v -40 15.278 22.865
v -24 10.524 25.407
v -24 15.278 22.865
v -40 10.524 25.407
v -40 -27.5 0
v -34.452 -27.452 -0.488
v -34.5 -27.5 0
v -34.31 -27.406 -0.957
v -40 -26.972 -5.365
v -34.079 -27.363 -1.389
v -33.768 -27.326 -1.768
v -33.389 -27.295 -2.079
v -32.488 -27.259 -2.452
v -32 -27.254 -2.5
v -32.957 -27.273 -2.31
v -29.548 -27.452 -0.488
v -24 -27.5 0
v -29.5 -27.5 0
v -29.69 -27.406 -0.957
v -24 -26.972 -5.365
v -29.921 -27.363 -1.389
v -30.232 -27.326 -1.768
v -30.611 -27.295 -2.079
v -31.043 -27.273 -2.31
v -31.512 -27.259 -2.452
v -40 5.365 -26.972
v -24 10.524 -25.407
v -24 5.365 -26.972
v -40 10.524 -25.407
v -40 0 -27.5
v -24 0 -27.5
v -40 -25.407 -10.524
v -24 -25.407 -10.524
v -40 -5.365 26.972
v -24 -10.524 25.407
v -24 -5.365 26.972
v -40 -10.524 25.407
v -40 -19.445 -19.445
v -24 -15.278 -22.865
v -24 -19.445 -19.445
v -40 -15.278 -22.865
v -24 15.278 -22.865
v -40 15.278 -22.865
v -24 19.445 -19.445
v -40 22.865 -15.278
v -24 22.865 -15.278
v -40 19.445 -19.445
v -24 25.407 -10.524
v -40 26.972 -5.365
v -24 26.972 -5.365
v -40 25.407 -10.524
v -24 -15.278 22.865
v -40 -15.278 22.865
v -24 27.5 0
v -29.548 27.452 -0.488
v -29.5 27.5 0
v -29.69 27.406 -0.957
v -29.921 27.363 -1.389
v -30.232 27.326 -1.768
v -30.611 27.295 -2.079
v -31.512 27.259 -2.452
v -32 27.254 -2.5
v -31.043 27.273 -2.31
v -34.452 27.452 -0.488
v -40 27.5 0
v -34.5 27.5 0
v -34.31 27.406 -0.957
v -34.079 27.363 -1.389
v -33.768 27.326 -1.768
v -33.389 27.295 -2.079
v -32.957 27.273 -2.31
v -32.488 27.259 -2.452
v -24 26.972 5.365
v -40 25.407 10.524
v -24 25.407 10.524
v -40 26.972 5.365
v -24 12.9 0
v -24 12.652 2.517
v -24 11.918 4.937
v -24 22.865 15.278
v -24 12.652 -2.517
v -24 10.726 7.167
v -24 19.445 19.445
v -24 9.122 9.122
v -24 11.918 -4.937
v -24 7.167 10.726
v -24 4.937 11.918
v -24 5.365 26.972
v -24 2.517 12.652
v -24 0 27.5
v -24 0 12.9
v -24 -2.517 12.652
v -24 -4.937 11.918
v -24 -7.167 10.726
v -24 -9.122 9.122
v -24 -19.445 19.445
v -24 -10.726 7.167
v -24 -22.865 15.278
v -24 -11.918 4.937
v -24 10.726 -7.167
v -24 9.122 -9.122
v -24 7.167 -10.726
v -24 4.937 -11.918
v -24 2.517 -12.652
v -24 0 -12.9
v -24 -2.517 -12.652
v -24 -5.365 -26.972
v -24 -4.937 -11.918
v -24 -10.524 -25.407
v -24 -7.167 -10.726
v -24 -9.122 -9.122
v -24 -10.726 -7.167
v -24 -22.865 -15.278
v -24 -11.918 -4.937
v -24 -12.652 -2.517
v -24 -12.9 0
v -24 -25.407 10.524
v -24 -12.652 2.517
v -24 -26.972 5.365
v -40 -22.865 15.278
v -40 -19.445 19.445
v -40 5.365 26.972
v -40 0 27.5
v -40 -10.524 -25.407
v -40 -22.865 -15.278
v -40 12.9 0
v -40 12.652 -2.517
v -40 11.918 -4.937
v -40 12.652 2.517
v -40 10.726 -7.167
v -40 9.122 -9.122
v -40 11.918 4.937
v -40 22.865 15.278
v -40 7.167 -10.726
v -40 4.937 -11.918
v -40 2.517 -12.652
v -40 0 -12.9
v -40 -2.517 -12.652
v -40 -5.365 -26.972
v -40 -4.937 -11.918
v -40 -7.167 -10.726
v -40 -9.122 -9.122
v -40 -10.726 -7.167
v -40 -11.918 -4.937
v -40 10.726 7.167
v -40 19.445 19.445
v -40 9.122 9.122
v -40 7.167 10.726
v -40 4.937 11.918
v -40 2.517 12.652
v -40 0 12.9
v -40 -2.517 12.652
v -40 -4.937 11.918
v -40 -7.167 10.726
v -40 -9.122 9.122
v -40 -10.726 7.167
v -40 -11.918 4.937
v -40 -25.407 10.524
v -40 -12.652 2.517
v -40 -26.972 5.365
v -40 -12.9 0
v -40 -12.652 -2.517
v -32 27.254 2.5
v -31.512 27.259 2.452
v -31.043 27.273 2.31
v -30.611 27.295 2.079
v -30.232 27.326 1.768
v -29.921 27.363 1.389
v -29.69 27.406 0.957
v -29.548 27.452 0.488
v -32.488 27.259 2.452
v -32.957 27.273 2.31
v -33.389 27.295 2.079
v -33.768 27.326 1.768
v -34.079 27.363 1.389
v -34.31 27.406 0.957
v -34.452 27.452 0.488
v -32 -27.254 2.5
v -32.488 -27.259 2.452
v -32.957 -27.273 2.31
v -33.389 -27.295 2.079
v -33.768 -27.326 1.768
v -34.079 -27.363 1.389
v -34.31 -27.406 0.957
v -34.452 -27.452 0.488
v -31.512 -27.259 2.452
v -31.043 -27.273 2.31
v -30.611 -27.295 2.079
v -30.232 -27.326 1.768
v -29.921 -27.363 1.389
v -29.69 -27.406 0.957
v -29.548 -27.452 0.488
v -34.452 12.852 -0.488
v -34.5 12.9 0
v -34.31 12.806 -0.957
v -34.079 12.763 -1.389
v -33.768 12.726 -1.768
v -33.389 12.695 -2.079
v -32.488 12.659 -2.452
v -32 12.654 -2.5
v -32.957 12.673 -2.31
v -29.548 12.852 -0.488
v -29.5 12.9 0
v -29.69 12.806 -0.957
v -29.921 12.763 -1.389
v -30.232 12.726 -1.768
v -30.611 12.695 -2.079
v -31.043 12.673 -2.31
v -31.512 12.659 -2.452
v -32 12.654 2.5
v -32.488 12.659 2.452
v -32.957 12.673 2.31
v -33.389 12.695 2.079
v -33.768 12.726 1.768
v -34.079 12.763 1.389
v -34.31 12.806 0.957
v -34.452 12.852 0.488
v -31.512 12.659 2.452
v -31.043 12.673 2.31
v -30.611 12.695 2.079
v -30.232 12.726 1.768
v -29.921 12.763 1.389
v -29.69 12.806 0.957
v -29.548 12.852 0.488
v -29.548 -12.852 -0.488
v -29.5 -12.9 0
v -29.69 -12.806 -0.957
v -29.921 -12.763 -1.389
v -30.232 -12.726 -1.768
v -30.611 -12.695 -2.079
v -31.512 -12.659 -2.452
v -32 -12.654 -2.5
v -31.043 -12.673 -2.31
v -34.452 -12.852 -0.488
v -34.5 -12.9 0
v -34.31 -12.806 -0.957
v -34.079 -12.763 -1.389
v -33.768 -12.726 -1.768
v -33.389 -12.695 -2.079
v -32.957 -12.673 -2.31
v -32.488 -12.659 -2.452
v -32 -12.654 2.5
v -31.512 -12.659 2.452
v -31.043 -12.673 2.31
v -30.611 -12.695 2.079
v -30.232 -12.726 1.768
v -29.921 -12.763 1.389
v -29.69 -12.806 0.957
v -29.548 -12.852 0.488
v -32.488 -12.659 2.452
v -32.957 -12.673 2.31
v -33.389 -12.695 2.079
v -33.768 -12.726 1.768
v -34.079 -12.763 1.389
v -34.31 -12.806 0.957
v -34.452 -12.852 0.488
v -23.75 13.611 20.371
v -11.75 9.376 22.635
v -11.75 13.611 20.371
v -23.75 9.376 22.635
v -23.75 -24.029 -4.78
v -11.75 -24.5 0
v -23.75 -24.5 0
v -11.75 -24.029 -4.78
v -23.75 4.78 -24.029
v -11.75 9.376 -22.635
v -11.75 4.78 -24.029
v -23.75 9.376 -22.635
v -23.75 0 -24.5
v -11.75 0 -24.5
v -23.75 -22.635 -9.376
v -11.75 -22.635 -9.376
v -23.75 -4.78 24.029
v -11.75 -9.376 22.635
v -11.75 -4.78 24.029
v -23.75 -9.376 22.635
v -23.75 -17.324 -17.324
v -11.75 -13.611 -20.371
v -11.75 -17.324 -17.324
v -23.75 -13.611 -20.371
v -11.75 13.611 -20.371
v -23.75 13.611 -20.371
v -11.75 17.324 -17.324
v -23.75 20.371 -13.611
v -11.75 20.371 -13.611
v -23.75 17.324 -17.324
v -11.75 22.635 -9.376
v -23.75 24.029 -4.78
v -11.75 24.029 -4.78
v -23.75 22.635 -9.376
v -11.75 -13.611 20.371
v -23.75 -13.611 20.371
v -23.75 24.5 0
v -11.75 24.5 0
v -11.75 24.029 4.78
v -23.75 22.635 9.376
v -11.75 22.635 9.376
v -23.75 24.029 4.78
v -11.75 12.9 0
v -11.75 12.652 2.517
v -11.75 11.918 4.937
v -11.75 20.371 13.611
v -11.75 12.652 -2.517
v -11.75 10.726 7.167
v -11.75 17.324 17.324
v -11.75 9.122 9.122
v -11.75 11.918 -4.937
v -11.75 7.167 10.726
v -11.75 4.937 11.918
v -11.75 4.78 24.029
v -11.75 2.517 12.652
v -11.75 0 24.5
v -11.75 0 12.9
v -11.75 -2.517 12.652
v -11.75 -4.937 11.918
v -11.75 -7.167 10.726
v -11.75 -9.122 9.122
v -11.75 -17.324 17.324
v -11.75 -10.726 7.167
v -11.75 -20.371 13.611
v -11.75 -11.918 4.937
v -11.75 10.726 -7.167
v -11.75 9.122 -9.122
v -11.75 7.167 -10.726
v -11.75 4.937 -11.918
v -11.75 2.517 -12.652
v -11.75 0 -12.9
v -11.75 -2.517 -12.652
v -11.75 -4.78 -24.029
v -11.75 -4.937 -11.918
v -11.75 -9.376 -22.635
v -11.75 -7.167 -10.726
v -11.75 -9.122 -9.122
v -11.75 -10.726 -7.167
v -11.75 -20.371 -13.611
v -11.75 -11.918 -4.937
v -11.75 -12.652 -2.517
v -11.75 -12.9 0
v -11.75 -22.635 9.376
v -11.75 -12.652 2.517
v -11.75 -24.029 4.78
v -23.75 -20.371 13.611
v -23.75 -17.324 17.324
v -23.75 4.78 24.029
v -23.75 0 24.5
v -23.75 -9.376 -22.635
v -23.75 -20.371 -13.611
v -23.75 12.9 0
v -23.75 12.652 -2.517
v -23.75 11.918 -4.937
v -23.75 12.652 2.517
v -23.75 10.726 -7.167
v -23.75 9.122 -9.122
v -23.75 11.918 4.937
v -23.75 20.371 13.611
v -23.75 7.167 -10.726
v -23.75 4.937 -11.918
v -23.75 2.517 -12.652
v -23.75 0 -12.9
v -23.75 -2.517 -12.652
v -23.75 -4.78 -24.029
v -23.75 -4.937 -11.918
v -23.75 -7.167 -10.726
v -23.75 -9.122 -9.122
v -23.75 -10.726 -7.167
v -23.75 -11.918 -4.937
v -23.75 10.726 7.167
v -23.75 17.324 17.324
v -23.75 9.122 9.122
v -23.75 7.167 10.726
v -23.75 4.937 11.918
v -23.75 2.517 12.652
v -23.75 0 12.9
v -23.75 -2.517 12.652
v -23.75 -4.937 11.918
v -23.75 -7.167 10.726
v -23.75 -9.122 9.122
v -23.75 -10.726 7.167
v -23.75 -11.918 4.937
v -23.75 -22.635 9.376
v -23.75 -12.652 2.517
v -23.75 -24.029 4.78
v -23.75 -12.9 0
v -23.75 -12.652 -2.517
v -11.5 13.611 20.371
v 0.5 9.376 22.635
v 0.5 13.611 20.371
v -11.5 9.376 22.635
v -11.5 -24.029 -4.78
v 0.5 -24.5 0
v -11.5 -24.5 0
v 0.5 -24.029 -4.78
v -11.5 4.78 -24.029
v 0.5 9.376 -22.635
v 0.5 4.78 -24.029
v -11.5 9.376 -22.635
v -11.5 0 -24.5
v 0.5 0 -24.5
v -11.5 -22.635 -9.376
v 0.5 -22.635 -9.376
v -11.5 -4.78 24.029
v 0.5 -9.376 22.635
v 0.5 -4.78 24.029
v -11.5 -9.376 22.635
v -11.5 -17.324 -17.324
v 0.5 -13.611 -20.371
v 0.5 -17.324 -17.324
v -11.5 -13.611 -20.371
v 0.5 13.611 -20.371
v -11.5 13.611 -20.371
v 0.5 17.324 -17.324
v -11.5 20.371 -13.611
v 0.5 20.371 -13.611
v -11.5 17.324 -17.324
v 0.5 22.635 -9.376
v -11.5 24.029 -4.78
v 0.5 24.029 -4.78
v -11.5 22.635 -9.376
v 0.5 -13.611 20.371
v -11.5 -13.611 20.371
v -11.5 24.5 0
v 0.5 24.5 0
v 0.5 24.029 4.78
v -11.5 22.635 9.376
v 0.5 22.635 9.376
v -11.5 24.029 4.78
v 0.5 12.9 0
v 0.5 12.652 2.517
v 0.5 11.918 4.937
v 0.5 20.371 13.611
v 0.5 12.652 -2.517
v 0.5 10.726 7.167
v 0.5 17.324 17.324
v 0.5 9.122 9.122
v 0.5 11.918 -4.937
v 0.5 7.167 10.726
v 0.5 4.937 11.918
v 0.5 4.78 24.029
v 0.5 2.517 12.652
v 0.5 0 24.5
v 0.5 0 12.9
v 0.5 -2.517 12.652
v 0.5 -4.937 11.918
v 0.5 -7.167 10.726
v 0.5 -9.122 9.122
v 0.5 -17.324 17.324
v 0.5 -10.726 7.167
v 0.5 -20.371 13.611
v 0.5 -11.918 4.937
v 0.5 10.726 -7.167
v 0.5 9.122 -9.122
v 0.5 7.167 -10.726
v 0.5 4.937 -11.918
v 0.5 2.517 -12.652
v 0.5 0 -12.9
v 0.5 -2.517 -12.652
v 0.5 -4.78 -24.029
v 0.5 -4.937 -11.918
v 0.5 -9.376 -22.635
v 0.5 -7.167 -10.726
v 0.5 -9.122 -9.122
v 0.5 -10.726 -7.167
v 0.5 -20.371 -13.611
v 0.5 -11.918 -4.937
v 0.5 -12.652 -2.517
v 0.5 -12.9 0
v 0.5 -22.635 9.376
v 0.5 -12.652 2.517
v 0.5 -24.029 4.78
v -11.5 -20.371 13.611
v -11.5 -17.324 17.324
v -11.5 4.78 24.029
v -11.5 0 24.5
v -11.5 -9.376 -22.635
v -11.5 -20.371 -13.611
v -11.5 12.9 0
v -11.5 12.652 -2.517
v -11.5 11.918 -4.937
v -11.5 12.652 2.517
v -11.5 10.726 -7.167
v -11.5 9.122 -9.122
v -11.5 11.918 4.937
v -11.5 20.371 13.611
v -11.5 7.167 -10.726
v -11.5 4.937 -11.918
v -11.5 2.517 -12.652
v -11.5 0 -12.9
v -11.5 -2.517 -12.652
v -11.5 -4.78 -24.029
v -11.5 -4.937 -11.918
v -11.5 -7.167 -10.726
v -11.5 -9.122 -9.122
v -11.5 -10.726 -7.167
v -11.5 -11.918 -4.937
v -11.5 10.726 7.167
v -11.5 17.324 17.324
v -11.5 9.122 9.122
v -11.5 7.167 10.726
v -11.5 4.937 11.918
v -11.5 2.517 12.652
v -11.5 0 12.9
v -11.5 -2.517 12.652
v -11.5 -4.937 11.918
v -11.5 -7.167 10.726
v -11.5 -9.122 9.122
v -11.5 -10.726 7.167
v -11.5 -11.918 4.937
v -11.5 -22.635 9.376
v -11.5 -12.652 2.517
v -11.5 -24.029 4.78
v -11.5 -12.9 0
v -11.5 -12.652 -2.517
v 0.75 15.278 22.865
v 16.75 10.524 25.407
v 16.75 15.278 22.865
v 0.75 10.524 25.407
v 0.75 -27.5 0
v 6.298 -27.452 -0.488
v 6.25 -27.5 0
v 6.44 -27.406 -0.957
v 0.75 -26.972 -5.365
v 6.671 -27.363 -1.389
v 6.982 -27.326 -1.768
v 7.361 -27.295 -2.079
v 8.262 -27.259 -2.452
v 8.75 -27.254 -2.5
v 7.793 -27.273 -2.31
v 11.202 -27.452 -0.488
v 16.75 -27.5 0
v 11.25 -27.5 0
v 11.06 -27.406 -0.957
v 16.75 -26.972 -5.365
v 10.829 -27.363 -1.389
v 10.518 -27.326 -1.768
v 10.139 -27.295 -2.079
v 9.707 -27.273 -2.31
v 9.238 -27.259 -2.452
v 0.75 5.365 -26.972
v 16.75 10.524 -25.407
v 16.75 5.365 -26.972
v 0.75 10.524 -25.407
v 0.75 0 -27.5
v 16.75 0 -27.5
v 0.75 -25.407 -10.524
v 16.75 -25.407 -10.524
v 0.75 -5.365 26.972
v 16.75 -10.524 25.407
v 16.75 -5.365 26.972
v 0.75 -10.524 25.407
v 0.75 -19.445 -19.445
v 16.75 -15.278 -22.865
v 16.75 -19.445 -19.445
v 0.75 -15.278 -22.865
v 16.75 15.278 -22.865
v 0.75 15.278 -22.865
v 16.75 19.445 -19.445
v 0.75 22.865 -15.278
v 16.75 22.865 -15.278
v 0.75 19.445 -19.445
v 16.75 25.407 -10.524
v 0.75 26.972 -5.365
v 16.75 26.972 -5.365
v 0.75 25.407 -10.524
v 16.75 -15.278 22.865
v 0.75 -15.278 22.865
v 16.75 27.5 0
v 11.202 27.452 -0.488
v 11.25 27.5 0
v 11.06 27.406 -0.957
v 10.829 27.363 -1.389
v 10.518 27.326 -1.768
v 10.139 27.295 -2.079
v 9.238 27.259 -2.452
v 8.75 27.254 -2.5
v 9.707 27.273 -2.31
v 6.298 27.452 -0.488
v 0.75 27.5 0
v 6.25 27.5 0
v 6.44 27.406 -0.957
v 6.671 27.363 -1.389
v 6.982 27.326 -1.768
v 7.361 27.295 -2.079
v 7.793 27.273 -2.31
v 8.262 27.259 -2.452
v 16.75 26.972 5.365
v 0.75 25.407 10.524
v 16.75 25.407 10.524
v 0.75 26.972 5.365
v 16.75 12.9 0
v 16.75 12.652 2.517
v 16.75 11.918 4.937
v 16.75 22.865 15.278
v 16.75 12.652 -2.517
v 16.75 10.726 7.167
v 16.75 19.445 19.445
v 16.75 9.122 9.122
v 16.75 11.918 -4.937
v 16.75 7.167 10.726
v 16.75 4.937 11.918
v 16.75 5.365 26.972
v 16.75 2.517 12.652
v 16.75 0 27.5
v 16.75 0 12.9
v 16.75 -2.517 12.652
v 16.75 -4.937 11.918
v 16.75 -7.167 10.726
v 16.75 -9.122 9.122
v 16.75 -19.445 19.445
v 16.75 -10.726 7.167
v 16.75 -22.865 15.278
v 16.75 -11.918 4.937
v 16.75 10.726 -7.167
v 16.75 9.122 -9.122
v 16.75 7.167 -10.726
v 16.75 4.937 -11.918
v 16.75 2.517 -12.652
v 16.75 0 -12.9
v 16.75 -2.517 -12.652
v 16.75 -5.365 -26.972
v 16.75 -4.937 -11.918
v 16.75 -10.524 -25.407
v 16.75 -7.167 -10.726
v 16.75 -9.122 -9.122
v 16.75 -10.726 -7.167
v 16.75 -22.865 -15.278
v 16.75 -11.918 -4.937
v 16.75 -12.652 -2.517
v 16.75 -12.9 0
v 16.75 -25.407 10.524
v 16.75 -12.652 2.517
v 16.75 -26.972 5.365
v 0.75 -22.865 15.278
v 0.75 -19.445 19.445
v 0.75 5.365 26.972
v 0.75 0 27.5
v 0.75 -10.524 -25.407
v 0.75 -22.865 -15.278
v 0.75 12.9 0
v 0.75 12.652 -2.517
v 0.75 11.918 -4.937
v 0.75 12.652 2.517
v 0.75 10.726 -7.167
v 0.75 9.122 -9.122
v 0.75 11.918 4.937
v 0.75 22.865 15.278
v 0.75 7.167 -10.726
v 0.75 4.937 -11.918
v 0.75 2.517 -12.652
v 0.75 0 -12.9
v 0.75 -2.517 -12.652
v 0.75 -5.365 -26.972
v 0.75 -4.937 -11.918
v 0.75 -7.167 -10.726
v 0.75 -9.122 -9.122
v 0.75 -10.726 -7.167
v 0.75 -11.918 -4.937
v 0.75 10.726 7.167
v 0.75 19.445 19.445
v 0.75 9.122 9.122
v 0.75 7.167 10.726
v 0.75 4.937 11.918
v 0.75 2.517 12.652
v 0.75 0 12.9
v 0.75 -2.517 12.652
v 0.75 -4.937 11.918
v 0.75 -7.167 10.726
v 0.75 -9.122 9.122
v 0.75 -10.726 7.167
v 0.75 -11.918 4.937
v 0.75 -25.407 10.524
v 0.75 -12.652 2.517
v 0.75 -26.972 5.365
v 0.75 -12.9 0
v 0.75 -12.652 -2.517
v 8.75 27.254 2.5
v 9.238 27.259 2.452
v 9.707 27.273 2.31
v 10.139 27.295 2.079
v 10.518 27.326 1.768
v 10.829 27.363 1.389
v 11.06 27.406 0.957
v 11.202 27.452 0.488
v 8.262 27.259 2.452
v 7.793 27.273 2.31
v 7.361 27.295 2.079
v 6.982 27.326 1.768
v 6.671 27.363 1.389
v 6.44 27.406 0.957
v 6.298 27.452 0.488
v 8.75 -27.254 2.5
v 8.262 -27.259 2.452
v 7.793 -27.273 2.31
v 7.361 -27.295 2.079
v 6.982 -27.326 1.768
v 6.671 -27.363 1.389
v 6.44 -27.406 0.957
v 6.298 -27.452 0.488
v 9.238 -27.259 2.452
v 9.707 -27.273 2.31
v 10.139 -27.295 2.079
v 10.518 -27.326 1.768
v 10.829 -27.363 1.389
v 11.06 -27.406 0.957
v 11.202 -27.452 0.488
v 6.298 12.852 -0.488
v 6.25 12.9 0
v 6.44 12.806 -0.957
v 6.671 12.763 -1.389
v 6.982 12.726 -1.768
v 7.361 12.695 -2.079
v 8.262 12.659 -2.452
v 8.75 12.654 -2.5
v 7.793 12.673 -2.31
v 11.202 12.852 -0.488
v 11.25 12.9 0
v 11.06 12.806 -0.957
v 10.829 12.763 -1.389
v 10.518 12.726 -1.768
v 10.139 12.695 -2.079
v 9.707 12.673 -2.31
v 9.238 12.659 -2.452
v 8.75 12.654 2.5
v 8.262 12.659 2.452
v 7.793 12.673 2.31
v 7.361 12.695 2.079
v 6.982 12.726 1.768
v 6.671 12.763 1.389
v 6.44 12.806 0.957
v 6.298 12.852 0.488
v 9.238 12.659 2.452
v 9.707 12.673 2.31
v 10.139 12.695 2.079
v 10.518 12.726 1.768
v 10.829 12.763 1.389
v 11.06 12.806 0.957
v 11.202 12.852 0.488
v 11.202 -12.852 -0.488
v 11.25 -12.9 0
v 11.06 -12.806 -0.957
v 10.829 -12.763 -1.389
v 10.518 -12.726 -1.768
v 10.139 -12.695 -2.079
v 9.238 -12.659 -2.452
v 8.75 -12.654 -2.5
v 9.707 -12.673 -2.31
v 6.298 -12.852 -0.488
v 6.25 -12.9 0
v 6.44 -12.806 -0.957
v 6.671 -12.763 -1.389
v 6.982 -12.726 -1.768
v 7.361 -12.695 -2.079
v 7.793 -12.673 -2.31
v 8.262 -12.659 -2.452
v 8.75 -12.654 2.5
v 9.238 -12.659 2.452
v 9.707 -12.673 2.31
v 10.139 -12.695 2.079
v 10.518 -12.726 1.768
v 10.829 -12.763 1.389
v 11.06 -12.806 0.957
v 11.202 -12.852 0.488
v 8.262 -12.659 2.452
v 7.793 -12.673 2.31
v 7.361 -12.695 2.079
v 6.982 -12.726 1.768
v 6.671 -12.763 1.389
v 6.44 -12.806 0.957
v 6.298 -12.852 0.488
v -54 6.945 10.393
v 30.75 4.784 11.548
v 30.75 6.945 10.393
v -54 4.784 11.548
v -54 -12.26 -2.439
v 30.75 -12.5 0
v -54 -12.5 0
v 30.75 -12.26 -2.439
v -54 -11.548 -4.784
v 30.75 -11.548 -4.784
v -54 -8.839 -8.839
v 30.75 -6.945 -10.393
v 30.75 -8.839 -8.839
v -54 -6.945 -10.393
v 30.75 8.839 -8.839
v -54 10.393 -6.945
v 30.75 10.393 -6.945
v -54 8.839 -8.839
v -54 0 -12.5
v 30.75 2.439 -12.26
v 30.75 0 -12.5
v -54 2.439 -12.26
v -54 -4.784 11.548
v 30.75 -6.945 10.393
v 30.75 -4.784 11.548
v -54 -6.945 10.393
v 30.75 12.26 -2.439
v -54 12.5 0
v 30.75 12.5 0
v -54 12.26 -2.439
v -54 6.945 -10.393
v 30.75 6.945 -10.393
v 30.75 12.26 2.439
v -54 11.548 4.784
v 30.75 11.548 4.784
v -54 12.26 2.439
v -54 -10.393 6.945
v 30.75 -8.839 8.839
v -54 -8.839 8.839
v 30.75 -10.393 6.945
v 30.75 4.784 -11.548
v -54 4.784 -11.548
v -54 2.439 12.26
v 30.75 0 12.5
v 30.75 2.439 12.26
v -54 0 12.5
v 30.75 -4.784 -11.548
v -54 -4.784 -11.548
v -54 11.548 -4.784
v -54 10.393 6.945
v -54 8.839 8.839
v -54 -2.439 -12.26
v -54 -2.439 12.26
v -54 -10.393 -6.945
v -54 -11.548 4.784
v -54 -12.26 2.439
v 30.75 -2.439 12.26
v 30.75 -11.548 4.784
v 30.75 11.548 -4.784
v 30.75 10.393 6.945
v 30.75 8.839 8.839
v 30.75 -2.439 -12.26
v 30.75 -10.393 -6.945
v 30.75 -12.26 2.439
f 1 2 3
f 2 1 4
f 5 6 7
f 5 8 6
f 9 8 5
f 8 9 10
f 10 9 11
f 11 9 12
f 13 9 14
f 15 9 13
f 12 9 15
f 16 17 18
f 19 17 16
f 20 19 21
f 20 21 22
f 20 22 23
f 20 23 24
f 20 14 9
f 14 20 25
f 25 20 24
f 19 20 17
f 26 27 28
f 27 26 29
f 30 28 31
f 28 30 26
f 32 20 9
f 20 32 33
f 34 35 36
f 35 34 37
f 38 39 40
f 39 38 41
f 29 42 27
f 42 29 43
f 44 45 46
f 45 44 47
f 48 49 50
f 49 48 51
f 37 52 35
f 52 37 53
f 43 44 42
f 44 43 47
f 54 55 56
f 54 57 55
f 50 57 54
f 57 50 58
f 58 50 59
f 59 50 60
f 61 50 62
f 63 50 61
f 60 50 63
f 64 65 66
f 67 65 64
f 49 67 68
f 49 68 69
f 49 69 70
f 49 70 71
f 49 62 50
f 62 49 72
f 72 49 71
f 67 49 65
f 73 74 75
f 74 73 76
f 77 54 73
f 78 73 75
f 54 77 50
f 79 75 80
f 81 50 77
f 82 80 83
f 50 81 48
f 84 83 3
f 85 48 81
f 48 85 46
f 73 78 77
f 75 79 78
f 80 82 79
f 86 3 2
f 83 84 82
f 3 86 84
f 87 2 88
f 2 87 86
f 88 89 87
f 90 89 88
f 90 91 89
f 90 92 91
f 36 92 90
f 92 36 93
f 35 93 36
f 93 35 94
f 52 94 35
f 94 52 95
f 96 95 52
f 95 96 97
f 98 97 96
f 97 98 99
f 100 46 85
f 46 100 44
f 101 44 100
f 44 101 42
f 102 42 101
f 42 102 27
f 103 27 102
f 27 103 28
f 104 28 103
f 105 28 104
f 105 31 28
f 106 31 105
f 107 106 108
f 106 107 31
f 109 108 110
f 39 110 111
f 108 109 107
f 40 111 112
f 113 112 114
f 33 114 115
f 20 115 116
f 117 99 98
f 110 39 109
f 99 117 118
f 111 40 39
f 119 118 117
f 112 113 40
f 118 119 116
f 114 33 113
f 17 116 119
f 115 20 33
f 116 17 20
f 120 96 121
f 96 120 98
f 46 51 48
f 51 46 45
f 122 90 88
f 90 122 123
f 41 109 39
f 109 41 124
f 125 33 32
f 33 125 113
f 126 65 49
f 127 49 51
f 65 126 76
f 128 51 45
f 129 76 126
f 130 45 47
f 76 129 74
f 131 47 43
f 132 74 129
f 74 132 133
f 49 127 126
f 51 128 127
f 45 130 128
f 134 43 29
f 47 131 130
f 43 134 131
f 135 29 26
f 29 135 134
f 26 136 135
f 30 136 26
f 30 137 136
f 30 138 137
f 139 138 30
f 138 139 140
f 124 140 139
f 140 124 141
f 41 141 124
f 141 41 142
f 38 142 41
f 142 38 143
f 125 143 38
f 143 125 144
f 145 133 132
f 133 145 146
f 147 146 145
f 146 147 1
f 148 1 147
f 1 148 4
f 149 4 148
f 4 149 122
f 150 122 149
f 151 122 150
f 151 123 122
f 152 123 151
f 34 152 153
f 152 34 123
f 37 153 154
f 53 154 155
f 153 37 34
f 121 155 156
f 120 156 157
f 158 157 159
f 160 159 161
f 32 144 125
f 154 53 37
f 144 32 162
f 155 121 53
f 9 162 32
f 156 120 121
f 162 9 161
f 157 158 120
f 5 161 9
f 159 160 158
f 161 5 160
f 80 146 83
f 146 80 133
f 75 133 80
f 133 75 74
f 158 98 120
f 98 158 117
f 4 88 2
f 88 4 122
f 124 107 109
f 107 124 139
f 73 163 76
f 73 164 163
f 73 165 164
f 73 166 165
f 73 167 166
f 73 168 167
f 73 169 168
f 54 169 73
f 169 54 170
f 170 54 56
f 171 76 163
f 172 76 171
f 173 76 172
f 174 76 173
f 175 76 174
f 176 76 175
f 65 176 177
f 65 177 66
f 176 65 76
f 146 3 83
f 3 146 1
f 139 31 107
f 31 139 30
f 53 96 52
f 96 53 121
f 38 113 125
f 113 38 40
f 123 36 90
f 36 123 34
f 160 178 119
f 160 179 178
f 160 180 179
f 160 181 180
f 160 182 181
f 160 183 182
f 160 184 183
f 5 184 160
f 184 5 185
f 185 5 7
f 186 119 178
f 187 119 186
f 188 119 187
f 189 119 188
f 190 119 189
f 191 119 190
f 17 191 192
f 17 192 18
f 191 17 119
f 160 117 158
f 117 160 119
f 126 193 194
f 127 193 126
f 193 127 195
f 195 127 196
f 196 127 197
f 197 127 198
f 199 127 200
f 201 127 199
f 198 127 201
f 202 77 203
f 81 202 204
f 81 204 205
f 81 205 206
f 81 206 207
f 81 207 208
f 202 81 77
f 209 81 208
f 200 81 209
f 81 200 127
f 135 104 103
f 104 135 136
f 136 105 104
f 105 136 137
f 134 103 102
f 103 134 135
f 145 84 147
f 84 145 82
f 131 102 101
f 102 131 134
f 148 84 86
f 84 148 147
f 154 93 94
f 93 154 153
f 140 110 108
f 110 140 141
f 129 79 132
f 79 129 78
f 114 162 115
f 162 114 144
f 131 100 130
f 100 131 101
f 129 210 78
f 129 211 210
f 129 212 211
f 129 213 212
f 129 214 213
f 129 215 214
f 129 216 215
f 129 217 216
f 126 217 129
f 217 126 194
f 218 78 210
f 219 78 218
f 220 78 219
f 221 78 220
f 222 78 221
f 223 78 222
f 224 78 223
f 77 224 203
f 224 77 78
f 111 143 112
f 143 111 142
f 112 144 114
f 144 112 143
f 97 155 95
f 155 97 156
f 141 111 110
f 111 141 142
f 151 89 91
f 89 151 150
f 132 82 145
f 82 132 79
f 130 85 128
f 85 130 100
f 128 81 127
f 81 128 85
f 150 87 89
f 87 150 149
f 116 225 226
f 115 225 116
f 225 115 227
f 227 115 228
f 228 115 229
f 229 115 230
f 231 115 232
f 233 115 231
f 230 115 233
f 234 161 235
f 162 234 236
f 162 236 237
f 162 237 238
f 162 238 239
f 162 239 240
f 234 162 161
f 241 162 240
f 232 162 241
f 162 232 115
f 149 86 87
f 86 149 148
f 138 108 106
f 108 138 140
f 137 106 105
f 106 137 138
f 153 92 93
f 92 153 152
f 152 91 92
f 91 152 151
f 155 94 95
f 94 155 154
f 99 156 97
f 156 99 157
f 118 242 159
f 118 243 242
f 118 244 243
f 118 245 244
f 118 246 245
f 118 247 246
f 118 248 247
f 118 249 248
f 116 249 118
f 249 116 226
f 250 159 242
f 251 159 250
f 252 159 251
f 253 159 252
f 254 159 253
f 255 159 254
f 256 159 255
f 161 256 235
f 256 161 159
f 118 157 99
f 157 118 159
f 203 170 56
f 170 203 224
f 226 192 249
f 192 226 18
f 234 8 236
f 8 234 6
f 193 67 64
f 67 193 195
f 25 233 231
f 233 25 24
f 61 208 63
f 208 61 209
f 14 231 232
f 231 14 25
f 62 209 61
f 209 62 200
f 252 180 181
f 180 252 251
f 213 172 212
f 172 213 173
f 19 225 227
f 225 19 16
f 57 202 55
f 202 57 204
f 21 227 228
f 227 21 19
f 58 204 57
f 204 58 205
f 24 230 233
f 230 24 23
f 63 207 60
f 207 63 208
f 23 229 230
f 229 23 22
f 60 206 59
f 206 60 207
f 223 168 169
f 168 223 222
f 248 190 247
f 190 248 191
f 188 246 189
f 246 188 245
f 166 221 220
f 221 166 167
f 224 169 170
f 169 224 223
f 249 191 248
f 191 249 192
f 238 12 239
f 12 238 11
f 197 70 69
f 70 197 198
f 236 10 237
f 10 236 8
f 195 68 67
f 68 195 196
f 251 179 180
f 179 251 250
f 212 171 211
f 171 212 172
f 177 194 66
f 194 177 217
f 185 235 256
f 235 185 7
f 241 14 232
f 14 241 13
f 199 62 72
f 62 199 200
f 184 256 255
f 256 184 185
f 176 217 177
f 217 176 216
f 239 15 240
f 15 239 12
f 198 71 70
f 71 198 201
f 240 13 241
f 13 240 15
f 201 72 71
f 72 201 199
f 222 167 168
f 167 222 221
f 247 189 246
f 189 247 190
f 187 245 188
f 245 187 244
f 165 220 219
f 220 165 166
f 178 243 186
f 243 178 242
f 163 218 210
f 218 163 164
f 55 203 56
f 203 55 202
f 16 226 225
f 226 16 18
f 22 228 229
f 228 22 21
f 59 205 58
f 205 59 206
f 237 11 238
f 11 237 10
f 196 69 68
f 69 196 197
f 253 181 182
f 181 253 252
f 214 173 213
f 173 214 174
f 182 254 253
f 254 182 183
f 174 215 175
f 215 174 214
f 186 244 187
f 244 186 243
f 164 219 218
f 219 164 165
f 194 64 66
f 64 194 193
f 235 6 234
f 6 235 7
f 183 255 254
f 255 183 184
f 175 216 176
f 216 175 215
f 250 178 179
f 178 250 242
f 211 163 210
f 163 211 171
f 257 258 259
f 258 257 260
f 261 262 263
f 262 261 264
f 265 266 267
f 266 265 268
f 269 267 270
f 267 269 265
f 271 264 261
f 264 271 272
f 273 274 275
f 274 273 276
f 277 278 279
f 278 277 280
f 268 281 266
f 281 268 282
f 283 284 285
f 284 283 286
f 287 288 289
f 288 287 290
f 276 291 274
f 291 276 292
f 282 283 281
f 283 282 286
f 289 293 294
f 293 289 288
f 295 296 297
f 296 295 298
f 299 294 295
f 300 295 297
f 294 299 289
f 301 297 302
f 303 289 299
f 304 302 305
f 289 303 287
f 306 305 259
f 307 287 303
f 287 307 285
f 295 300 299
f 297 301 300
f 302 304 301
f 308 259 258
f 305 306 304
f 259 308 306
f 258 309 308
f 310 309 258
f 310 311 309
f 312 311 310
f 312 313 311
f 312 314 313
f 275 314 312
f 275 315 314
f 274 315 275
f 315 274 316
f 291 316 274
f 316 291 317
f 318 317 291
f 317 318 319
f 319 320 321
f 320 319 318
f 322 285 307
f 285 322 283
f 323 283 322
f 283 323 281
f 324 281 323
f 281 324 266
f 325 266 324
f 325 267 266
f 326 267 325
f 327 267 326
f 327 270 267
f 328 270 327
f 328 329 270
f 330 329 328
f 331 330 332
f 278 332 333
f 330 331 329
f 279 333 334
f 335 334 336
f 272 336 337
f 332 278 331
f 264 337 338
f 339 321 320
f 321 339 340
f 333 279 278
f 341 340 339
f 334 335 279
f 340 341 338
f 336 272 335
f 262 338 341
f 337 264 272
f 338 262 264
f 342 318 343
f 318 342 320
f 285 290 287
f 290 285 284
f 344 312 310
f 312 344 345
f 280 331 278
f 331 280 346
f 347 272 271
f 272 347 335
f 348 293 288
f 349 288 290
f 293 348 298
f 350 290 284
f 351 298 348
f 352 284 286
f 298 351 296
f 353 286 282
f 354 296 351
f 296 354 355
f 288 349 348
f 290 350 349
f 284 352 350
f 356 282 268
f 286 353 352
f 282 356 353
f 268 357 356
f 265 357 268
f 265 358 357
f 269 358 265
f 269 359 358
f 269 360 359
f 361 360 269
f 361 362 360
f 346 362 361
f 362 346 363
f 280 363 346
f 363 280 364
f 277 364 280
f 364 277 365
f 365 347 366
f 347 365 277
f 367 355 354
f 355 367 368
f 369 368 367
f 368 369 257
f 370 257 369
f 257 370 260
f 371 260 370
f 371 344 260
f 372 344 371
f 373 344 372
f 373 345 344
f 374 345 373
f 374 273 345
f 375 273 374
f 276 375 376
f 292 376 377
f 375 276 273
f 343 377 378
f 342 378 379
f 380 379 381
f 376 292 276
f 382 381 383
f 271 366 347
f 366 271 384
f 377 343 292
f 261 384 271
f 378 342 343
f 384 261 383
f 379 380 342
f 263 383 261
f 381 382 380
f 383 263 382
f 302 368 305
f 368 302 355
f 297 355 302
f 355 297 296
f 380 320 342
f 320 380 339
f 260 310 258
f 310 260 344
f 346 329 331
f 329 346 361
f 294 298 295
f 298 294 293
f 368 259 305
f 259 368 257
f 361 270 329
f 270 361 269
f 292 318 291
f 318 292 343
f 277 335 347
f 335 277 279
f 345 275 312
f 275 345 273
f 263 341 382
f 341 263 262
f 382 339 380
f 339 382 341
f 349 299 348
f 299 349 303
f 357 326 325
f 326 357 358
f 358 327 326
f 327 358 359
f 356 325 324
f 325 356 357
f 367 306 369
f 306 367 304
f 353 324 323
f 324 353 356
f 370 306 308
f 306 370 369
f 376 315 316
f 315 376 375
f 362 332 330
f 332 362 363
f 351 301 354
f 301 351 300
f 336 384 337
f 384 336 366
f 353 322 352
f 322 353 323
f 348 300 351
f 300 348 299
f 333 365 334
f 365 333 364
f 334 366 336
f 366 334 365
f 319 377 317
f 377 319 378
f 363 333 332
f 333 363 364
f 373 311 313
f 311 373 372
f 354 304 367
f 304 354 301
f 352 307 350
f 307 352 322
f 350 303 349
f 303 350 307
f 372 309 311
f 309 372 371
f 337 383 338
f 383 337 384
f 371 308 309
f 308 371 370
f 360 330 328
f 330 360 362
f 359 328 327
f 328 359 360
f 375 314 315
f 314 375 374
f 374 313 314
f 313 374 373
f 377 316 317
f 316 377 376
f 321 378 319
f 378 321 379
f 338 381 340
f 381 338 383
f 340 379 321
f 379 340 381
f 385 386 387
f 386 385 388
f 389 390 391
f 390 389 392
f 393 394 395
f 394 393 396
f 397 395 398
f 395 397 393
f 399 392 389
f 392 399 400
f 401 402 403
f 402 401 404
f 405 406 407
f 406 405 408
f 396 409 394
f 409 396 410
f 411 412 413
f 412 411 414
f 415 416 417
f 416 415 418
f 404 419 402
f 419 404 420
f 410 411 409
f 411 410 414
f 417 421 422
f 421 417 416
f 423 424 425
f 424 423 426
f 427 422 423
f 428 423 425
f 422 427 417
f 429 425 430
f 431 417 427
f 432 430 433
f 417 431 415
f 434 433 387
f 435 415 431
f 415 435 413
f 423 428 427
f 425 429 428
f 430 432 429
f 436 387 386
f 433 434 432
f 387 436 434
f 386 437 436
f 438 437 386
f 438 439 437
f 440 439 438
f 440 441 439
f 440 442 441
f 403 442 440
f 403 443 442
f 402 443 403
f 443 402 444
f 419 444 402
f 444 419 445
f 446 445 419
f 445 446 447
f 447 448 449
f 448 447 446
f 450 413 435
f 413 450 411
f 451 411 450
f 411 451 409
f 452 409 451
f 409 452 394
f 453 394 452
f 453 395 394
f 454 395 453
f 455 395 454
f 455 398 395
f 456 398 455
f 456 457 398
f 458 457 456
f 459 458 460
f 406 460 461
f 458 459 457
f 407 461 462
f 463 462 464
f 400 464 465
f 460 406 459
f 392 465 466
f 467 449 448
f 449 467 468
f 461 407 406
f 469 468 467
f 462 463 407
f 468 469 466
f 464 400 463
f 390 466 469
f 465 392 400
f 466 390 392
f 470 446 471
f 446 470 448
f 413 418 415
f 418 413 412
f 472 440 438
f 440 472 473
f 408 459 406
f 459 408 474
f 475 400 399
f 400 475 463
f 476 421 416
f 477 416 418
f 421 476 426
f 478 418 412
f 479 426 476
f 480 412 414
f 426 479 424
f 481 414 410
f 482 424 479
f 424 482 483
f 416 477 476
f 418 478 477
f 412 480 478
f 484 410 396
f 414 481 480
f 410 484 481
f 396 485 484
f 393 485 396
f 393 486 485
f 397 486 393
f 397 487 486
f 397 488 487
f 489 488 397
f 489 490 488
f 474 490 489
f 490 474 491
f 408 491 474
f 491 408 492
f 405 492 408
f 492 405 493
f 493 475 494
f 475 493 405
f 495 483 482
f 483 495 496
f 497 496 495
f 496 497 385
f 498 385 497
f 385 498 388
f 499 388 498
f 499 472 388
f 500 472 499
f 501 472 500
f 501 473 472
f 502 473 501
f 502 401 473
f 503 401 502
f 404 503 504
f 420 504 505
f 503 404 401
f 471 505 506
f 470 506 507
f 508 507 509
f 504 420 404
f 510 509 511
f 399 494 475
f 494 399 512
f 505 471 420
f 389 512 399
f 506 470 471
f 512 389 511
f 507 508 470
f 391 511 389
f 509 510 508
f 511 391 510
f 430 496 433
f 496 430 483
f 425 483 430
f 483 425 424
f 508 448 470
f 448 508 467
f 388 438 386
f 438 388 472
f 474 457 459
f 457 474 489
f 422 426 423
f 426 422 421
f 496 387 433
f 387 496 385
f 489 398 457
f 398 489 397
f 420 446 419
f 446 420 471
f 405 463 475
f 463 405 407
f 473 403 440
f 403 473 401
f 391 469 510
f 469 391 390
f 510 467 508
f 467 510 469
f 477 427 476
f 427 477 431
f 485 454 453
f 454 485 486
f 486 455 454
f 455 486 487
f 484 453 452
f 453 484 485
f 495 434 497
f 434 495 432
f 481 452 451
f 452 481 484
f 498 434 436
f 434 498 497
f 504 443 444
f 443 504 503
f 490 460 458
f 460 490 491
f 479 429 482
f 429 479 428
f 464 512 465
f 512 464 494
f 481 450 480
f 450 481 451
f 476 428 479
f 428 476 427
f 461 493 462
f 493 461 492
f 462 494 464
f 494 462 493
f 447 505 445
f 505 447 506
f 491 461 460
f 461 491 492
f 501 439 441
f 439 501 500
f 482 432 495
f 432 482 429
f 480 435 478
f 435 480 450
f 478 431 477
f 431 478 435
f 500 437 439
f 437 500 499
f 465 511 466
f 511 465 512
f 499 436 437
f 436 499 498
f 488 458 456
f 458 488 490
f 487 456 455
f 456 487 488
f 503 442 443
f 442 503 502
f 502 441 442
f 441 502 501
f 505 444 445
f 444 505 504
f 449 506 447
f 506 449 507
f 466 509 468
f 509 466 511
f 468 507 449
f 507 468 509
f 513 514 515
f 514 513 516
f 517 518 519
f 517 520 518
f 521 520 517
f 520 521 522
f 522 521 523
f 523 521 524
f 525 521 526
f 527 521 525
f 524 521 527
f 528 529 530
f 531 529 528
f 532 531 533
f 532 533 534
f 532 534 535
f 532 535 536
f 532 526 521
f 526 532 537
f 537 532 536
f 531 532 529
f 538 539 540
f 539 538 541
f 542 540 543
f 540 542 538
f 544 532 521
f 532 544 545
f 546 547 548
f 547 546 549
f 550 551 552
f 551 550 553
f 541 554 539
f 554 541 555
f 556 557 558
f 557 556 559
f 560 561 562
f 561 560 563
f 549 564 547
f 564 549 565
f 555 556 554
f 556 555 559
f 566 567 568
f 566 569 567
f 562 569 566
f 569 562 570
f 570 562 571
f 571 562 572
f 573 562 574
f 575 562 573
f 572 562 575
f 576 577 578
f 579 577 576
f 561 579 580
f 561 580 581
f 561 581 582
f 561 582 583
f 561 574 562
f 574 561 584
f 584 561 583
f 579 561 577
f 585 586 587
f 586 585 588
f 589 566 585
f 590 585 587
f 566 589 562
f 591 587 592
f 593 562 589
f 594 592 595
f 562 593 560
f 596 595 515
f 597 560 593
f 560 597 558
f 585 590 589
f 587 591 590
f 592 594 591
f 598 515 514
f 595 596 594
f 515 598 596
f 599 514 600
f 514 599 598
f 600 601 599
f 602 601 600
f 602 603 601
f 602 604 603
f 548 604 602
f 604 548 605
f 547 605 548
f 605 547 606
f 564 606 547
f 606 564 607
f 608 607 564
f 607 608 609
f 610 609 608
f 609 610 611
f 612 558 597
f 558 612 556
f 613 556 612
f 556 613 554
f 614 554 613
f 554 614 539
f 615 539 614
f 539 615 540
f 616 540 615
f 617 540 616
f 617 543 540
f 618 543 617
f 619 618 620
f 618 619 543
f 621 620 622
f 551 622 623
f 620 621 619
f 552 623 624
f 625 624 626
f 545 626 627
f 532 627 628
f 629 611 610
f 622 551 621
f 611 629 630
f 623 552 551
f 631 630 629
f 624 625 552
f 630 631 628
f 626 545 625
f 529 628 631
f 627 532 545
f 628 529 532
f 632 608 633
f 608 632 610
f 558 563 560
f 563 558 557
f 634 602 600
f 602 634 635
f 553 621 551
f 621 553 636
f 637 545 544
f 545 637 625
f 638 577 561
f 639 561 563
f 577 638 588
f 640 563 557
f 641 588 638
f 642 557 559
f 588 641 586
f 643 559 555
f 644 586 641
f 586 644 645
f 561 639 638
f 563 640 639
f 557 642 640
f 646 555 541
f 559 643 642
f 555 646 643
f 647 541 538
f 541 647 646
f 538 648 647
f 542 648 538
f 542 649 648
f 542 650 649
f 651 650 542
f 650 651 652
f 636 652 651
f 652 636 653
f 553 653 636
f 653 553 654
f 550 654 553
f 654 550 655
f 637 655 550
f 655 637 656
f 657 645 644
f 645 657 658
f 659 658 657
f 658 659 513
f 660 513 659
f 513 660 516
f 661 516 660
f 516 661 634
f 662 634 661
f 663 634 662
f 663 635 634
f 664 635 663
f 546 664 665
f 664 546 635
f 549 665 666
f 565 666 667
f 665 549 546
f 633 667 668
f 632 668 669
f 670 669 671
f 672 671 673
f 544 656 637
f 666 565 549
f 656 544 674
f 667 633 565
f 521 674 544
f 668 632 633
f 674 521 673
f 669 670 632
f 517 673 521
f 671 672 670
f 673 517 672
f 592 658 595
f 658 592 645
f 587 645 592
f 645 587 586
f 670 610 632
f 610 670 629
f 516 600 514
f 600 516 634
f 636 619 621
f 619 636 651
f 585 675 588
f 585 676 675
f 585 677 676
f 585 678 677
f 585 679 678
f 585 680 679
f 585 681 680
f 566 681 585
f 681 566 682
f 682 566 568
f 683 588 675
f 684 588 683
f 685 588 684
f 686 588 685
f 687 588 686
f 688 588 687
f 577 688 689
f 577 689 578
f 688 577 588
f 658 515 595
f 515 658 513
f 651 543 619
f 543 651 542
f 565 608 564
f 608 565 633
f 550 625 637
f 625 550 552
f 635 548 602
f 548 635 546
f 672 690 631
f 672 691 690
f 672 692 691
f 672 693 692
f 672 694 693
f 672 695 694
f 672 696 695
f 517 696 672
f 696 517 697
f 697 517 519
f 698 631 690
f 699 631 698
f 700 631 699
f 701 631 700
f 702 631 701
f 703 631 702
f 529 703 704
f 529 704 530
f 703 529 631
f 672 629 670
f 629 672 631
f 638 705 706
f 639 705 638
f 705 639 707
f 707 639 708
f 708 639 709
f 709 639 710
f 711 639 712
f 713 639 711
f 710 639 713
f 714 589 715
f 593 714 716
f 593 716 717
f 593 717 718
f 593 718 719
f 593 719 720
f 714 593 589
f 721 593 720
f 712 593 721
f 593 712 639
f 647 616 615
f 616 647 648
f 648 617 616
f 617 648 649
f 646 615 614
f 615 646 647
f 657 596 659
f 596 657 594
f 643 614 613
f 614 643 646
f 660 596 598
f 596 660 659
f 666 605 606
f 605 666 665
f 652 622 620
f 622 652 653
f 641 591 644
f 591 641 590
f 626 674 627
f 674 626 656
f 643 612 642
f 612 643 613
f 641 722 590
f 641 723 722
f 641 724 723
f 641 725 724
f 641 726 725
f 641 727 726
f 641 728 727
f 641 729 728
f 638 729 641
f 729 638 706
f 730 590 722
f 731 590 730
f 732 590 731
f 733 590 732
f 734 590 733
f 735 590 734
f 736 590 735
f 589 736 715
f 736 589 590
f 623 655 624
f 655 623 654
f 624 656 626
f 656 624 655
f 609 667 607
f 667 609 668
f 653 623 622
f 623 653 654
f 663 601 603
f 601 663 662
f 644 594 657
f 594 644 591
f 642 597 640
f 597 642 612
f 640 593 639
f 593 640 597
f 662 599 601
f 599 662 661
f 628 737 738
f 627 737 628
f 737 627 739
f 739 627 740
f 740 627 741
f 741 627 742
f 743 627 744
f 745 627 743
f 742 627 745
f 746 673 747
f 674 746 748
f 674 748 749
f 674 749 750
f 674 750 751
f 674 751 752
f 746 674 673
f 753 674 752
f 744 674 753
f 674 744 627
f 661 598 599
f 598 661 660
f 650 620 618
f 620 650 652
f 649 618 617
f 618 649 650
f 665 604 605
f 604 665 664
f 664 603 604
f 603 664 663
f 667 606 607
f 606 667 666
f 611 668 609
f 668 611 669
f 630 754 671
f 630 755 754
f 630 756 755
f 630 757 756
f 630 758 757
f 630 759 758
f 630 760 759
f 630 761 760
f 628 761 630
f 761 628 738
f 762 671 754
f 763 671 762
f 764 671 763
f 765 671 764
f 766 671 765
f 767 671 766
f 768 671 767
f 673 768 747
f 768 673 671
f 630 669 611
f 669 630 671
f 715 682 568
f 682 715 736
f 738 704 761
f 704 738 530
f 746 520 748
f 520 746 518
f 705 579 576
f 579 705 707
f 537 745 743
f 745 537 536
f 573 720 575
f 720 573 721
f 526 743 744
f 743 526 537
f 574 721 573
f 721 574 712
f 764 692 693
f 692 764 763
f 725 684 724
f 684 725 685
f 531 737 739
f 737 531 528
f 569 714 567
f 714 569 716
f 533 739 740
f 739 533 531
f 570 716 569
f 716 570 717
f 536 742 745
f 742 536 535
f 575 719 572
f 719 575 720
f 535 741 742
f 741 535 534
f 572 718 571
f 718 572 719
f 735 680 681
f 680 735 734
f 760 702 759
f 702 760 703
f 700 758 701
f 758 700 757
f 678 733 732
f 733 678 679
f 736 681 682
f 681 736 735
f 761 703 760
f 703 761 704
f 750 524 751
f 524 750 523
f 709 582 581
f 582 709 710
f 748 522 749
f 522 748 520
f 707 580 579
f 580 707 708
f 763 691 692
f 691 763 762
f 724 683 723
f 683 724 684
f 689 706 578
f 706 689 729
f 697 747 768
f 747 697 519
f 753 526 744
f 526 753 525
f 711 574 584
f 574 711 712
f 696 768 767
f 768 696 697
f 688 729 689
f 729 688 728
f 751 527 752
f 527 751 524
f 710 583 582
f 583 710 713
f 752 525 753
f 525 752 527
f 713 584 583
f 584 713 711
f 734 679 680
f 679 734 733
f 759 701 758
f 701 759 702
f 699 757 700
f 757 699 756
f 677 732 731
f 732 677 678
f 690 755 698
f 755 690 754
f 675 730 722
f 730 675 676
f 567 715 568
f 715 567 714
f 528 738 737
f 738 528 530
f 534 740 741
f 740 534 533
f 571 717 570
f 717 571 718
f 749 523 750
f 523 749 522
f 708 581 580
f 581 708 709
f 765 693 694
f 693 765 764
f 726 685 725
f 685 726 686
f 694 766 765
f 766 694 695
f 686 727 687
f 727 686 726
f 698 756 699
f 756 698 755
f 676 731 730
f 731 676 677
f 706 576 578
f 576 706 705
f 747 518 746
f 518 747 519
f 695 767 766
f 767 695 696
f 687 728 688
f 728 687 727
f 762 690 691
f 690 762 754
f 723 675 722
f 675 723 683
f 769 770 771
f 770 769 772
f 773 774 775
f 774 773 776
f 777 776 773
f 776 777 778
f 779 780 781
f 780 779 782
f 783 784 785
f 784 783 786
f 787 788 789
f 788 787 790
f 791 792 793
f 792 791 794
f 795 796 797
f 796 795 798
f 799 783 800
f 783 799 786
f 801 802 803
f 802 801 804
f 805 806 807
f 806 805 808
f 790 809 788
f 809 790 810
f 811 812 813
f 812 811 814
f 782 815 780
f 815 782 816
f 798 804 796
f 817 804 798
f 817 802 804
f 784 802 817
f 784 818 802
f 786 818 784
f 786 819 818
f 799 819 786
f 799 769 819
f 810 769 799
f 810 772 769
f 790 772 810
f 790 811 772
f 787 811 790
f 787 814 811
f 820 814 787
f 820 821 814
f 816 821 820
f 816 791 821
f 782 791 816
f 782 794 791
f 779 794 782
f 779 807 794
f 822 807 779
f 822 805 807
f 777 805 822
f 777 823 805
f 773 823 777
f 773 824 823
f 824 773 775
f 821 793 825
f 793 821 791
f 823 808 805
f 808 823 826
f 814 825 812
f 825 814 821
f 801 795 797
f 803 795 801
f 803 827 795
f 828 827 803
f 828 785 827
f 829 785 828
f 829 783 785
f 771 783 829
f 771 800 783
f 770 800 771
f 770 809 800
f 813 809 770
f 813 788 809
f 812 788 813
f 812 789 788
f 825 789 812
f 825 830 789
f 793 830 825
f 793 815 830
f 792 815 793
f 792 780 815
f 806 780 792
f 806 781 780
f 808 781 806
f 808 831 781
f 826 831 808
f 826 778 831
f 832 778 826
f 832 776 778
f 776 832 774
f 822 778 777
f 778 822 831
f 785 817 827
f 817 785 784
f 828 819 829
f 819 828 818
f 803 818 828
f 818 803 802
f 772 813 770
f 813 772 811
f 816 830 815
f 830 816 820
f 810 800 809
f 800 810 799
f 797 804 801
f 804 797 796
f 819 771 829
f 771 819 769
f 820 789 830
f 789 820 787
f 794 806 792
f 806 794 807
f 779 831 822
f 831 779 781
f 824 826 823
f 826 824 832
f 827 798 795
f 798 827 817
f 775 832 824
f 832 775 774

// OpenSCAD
$fn = 32;

// ------------------------------------------------------------------------
// Shaft with rings and collars: d25 shaft, 4 rings
// Every part is its own module, assembly() places them once.
// ------------------------------------------------------------------------

// --- part 1 ---
module shaft() {
  translate([0, 0, -42.375]) cylinder(h = 84.75, d = 25);
}

// --- part 2 ---
module collar_a() {
  difference() {
    cylinder(h = 16, d = 55);
    translate([0, 0, -1]) cylinder(h = 18, d = 25.8);
    translate([0, 0, 8]) rotate([90, 0, 0]) cylinder(h = 57, d = 5, center = true);
  }
}

// --- part 3 ---
module spacer_a() {
  difference() {
      translate([0, 0, 0]) cylinder(h = 12, d = 49);
      translate([0, 0, -1]) cylinder(h = 14, d = 25.8);
    }
}

// --- part 4 ---
module spacer_b() {
  difference() {
      translate([0, 0, 0]) cylinder(h = 12, d = 49);
      translate([0, 0, -1]) cylinder(h = 14, d = 25.8);
    }
}

// --- part 5 ---
module collar_b() {
  difference() {
    cylinder(h = 16, d = 55);
    translate([0, 0, -1]) cylinder(h = 18, d = 25.8);
    translate([0, 0, 8]) rotate([90, 0, 0]) cylinder(h = 57, d = 5, center = true);
  }
}

// --- assembly ---
module assembly() {
  translate([-11.625, 0, 0]) rotate([0, 90, 0]) shaft();
  translate([-40, 0, 0]) rotate([0, 90, 0]) collar_a();
  translate([-23.75, 0, 0]) rotate([0, 90, 0]) spacer_a();
  translate([-11.5, 0, 0]) rotate([0, 90, 0]) spacer_b();
  translate([0.75, 0, 0]) rotate([0, 90, 0]) collar_b();
}

assembly();
